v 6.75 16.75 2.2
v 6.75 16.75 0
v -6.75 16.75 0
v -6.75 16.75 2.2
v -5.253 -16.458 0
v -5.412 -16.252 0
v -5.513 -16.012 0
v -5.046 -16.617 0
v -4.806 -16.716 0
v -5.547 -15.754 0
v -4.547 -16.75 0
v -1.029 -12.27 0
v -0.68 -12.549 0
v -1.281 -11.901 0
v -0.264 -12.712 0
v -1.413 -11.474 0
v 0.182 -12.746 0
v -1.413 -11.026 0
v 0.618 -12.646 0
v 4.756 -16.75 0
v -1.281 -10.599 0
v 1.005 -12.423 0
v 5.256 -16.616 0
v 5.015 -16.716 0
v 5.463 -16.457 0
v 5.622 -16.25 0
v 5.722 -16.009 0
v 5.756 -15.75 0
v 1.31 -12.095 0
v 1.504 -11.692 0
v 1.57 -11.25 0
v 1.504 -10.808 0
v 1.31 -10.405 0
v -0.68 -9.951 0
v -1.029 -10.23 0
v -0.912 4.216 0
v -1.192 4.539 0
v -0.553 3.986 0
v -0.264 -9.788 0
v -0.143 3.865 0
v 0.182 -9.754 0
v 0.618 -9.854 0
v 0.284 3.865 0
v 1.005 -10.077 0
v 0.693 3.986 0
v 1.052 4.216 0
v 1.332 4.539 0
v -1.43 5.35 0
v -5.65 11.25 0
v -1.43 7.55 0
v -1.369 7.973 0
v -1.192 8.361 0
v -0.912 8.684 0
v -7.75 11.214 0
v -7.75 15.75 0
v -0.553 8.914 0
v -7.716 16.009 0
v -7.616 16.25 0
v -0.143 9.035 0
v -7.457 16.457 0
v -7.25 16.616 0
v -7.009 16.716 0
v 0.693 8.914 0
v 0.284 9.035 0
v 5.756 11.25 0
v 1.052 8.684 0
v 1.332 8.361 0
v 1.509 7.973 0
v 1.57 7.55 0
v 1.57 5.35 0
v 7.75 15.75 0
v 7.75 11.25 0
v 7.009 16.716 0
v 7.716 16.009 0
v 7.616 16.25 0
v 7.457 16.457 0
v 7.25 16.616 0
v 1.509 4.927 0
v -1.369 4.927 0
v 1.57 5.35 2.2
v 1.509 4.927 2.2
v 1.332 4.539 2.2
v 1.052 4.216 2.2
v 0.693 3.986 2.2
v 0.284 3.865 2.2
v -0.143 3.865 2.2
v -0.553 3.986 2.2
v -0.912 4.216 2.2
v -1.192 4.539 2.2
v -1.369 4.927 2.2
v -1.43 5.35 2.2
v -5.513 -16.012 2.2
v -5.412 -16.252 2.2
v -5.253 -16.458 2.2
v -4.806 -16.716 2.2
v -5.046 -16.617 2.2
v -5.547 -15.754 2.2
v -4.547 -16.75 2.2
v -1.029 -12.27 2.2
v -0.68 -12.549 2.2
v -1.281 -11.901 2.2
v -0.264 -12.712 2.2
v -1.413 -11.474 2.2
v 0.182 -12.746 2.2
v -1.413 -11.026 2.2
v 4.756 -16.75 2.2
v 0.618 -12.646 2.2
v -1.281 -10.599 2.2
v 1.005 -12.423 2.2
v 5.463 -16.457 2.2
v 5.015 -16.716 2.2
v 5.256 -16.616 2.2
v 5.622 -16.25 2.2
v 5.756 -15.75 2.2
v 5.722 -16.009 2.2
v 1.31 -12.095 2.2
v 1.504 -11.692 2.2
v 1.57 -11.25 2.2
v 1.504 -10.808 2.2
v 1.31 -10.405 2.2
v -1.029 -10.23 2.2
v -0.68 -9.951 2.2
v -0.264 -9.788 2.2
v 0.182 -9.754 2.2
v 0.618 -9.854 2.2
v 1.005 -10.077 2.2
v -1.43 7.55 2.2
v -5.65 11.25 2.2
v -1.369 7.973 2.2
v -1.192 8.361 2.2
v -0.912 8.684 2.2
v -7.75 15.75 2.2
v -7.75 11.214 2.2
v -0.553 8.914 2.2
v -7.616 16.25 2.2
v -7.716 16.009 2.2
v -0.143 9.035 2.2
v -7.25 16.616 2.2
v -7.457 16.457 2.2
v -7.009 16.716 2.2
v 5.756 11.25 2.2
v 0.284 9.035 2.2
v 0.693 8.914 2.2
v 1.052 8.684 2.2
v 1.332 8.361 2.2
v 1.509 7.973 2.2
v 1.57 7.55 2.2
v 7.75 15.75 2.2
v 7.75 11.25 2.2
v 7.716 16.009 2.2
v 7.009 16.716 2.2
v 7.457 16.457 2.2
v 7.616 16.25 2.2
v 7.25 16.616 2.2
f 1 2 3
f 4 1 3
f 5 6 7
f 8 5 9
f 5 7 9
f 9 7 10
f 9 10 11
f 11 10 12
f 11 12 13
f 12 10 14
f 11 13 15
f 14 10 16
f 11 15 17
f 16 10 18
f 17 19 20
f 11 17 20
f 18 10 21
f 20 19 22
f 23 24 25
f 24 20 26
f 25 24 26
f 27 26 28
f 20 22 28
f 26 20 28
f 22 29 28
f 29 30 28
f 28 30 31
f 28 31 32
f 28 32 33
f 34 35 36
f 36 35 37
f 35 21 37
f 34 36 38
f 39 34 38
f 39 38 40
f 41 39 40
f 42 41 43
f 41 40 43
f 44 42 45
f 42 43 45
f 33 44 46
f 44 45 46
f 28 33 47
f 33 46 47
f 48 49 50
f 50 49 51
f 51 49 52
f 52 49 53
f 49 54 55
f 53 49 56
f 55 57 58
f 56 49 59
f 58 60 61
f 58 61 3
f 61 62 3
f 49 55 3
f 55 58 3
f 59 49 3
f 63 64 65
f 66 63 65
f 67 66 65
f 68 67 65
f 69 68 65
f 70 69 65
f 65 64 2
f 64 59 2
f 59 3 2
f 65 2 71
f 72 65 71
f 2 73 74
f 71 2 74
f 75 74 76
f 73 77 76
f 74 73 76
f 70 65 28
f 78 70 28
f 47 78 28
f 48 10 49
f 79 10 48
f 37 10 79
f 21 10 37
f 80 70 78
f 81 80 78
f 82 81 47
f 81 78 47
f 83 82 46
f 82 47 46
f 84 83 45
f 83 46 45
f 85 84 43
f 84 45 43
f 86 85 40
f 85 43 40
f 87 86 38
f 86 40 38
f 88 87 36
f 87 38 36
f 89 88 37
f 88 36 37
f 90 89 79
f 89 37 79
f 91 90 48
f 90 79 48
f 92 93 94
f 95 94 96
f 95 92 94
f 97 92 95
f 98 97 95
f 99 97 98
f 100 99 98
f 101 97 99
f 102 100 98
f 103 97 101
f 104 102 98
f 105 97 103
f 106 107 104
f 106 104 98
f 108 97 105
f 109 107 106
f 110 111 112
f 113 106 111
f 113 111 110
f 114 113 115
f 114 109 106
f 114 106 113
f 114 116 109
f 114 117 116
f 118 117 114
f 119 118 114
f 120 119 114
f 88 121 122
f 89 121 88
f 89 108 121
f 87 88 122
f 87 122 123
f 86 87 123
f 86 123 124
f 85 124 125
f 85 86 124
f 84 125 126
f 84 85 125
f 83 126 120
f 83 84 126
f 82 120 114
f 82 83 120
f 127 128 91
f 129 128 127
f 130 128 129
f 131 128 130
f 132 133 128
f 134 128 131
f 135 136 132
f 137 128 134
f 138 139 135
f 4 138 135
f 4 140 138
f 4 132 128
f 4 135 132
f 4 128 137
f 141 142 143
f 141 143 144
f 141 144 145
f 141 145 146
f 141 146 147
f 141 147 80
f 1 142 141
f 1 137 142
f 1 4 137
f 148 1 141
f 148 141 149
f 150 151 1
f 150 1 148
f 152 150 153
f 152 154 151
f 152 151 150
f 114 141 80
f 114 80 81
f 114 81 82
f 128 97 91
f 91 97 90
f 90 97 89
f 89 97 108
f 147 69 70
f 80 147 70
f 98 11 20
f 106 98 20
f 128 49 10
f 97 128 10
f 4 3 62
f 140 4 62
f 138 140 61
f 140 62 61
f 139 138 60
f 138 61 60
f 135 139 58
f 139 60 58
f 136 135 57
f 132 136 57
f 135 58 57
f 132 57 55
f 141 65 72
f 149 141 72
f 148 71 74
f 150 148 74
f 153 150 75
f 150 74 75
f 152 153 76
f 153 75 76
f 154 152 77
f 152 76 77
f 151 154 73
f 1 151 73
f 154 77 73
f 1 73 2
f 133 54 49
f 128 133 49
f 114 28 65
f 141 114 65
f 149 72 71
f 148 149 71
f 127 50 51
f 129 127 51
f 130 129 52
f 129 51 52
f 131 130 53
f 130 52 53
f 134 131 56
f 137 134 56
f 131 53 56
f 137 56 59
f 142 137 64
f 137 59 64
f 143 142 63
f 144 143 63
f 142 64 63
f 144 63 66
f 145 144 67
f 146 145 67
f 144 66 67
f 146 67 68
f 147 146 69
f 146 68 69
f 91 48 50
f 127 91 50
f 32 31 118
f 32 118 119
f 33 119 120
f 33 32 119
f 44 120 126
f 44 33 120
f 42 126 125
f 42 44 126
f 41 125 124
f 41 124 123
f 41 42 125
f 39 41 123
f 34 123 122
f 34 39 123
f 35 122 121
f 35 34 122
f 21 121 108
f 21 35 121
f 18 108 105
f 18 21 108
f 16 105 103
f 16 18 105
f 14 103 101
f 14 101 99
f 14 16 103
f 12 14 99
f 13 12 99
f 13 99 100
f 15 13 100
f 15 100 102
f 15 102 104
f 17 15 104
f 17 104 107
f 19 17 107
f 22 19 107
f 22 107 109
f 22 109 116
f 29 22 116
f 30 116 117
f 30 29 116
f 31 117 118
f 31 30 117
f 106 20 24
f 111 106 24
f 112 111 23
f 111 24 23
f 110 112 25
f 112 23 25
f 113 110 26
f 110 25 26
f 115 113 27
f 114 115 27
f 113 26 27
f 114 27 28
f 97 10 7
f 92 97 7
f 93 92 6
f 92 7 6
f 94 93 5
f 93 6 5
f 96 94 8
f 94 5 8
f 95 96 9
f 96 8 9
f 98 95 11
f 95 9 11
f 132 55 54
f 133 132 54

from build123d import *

# Parameters (mm, degrees)
SKETCH1_R           = 1.5
BOSS_EXTRUDE1_DEPTH = 2.2


with BuildPart() as part:
    # Sketch1 → Boss-Extrude1 (new body)
    with BuildSketch(Plane.XY):
        with BuildLine():
            Line((-4.547445363, -16.75), (4.756345477, -16.75))
            ThreePointArc((4.756345477, -16.75), (5.463452258, -16.457106781), (5.756345477, -15.75))
            Line((5.756345477, -15.75), (5.756345477, 11.25))
            Line((5.756345477, 11.25), (7.75, 11.25))
            Line((7.75, 11.25), (7.75, 15.75))
            ThreePointArc((7.75, 15.75), (7.457106781, 16.457106781), (6.75, 16.75))
            Line((6.75, 16.75), (-6.75, 16.75))
            ThreePointArc((-6.75, 16.75), (-7.457106781, 16.457106781), (-7.75, 15.75))
            Line((-7.75, 15.75), (-7.75, 11.213631532))
            Line((-7.75, 11.213631532), (-5.65, 11.25))
            Line((-5.65, 11.25), (-5.547438151, -15.753798025))
            ThreePointArc((-5.547438151, -15.753798025), (-5.253208062, -16.458448313), (-4.547445363, -16.75))
        make_face()
        with Locations((0.070153023, -11.25)):
            Circle(SKETCH1_R, mode=Mode.SUBTRACT)
        with BuildLine():
            Line((-1.429846977, 5.35), (-1.429846977, 7.55))
            ThreePointArc((-1.429846977, 7.55), (0.070153023, 9.05), (1.570153023, 7.55))
            Line((1.570153023, 7.55), (1.570153023, 5.35))
            ThreePointArc((1.570153023, 5.35), (0.070153023, 3.85), (-1.429846977, 5.35))
        make_face(mode=Mode.SUBTRACT)
    extrude(amount=BOSS_EXTRUDE1_DEPTH)


solid = part.part
